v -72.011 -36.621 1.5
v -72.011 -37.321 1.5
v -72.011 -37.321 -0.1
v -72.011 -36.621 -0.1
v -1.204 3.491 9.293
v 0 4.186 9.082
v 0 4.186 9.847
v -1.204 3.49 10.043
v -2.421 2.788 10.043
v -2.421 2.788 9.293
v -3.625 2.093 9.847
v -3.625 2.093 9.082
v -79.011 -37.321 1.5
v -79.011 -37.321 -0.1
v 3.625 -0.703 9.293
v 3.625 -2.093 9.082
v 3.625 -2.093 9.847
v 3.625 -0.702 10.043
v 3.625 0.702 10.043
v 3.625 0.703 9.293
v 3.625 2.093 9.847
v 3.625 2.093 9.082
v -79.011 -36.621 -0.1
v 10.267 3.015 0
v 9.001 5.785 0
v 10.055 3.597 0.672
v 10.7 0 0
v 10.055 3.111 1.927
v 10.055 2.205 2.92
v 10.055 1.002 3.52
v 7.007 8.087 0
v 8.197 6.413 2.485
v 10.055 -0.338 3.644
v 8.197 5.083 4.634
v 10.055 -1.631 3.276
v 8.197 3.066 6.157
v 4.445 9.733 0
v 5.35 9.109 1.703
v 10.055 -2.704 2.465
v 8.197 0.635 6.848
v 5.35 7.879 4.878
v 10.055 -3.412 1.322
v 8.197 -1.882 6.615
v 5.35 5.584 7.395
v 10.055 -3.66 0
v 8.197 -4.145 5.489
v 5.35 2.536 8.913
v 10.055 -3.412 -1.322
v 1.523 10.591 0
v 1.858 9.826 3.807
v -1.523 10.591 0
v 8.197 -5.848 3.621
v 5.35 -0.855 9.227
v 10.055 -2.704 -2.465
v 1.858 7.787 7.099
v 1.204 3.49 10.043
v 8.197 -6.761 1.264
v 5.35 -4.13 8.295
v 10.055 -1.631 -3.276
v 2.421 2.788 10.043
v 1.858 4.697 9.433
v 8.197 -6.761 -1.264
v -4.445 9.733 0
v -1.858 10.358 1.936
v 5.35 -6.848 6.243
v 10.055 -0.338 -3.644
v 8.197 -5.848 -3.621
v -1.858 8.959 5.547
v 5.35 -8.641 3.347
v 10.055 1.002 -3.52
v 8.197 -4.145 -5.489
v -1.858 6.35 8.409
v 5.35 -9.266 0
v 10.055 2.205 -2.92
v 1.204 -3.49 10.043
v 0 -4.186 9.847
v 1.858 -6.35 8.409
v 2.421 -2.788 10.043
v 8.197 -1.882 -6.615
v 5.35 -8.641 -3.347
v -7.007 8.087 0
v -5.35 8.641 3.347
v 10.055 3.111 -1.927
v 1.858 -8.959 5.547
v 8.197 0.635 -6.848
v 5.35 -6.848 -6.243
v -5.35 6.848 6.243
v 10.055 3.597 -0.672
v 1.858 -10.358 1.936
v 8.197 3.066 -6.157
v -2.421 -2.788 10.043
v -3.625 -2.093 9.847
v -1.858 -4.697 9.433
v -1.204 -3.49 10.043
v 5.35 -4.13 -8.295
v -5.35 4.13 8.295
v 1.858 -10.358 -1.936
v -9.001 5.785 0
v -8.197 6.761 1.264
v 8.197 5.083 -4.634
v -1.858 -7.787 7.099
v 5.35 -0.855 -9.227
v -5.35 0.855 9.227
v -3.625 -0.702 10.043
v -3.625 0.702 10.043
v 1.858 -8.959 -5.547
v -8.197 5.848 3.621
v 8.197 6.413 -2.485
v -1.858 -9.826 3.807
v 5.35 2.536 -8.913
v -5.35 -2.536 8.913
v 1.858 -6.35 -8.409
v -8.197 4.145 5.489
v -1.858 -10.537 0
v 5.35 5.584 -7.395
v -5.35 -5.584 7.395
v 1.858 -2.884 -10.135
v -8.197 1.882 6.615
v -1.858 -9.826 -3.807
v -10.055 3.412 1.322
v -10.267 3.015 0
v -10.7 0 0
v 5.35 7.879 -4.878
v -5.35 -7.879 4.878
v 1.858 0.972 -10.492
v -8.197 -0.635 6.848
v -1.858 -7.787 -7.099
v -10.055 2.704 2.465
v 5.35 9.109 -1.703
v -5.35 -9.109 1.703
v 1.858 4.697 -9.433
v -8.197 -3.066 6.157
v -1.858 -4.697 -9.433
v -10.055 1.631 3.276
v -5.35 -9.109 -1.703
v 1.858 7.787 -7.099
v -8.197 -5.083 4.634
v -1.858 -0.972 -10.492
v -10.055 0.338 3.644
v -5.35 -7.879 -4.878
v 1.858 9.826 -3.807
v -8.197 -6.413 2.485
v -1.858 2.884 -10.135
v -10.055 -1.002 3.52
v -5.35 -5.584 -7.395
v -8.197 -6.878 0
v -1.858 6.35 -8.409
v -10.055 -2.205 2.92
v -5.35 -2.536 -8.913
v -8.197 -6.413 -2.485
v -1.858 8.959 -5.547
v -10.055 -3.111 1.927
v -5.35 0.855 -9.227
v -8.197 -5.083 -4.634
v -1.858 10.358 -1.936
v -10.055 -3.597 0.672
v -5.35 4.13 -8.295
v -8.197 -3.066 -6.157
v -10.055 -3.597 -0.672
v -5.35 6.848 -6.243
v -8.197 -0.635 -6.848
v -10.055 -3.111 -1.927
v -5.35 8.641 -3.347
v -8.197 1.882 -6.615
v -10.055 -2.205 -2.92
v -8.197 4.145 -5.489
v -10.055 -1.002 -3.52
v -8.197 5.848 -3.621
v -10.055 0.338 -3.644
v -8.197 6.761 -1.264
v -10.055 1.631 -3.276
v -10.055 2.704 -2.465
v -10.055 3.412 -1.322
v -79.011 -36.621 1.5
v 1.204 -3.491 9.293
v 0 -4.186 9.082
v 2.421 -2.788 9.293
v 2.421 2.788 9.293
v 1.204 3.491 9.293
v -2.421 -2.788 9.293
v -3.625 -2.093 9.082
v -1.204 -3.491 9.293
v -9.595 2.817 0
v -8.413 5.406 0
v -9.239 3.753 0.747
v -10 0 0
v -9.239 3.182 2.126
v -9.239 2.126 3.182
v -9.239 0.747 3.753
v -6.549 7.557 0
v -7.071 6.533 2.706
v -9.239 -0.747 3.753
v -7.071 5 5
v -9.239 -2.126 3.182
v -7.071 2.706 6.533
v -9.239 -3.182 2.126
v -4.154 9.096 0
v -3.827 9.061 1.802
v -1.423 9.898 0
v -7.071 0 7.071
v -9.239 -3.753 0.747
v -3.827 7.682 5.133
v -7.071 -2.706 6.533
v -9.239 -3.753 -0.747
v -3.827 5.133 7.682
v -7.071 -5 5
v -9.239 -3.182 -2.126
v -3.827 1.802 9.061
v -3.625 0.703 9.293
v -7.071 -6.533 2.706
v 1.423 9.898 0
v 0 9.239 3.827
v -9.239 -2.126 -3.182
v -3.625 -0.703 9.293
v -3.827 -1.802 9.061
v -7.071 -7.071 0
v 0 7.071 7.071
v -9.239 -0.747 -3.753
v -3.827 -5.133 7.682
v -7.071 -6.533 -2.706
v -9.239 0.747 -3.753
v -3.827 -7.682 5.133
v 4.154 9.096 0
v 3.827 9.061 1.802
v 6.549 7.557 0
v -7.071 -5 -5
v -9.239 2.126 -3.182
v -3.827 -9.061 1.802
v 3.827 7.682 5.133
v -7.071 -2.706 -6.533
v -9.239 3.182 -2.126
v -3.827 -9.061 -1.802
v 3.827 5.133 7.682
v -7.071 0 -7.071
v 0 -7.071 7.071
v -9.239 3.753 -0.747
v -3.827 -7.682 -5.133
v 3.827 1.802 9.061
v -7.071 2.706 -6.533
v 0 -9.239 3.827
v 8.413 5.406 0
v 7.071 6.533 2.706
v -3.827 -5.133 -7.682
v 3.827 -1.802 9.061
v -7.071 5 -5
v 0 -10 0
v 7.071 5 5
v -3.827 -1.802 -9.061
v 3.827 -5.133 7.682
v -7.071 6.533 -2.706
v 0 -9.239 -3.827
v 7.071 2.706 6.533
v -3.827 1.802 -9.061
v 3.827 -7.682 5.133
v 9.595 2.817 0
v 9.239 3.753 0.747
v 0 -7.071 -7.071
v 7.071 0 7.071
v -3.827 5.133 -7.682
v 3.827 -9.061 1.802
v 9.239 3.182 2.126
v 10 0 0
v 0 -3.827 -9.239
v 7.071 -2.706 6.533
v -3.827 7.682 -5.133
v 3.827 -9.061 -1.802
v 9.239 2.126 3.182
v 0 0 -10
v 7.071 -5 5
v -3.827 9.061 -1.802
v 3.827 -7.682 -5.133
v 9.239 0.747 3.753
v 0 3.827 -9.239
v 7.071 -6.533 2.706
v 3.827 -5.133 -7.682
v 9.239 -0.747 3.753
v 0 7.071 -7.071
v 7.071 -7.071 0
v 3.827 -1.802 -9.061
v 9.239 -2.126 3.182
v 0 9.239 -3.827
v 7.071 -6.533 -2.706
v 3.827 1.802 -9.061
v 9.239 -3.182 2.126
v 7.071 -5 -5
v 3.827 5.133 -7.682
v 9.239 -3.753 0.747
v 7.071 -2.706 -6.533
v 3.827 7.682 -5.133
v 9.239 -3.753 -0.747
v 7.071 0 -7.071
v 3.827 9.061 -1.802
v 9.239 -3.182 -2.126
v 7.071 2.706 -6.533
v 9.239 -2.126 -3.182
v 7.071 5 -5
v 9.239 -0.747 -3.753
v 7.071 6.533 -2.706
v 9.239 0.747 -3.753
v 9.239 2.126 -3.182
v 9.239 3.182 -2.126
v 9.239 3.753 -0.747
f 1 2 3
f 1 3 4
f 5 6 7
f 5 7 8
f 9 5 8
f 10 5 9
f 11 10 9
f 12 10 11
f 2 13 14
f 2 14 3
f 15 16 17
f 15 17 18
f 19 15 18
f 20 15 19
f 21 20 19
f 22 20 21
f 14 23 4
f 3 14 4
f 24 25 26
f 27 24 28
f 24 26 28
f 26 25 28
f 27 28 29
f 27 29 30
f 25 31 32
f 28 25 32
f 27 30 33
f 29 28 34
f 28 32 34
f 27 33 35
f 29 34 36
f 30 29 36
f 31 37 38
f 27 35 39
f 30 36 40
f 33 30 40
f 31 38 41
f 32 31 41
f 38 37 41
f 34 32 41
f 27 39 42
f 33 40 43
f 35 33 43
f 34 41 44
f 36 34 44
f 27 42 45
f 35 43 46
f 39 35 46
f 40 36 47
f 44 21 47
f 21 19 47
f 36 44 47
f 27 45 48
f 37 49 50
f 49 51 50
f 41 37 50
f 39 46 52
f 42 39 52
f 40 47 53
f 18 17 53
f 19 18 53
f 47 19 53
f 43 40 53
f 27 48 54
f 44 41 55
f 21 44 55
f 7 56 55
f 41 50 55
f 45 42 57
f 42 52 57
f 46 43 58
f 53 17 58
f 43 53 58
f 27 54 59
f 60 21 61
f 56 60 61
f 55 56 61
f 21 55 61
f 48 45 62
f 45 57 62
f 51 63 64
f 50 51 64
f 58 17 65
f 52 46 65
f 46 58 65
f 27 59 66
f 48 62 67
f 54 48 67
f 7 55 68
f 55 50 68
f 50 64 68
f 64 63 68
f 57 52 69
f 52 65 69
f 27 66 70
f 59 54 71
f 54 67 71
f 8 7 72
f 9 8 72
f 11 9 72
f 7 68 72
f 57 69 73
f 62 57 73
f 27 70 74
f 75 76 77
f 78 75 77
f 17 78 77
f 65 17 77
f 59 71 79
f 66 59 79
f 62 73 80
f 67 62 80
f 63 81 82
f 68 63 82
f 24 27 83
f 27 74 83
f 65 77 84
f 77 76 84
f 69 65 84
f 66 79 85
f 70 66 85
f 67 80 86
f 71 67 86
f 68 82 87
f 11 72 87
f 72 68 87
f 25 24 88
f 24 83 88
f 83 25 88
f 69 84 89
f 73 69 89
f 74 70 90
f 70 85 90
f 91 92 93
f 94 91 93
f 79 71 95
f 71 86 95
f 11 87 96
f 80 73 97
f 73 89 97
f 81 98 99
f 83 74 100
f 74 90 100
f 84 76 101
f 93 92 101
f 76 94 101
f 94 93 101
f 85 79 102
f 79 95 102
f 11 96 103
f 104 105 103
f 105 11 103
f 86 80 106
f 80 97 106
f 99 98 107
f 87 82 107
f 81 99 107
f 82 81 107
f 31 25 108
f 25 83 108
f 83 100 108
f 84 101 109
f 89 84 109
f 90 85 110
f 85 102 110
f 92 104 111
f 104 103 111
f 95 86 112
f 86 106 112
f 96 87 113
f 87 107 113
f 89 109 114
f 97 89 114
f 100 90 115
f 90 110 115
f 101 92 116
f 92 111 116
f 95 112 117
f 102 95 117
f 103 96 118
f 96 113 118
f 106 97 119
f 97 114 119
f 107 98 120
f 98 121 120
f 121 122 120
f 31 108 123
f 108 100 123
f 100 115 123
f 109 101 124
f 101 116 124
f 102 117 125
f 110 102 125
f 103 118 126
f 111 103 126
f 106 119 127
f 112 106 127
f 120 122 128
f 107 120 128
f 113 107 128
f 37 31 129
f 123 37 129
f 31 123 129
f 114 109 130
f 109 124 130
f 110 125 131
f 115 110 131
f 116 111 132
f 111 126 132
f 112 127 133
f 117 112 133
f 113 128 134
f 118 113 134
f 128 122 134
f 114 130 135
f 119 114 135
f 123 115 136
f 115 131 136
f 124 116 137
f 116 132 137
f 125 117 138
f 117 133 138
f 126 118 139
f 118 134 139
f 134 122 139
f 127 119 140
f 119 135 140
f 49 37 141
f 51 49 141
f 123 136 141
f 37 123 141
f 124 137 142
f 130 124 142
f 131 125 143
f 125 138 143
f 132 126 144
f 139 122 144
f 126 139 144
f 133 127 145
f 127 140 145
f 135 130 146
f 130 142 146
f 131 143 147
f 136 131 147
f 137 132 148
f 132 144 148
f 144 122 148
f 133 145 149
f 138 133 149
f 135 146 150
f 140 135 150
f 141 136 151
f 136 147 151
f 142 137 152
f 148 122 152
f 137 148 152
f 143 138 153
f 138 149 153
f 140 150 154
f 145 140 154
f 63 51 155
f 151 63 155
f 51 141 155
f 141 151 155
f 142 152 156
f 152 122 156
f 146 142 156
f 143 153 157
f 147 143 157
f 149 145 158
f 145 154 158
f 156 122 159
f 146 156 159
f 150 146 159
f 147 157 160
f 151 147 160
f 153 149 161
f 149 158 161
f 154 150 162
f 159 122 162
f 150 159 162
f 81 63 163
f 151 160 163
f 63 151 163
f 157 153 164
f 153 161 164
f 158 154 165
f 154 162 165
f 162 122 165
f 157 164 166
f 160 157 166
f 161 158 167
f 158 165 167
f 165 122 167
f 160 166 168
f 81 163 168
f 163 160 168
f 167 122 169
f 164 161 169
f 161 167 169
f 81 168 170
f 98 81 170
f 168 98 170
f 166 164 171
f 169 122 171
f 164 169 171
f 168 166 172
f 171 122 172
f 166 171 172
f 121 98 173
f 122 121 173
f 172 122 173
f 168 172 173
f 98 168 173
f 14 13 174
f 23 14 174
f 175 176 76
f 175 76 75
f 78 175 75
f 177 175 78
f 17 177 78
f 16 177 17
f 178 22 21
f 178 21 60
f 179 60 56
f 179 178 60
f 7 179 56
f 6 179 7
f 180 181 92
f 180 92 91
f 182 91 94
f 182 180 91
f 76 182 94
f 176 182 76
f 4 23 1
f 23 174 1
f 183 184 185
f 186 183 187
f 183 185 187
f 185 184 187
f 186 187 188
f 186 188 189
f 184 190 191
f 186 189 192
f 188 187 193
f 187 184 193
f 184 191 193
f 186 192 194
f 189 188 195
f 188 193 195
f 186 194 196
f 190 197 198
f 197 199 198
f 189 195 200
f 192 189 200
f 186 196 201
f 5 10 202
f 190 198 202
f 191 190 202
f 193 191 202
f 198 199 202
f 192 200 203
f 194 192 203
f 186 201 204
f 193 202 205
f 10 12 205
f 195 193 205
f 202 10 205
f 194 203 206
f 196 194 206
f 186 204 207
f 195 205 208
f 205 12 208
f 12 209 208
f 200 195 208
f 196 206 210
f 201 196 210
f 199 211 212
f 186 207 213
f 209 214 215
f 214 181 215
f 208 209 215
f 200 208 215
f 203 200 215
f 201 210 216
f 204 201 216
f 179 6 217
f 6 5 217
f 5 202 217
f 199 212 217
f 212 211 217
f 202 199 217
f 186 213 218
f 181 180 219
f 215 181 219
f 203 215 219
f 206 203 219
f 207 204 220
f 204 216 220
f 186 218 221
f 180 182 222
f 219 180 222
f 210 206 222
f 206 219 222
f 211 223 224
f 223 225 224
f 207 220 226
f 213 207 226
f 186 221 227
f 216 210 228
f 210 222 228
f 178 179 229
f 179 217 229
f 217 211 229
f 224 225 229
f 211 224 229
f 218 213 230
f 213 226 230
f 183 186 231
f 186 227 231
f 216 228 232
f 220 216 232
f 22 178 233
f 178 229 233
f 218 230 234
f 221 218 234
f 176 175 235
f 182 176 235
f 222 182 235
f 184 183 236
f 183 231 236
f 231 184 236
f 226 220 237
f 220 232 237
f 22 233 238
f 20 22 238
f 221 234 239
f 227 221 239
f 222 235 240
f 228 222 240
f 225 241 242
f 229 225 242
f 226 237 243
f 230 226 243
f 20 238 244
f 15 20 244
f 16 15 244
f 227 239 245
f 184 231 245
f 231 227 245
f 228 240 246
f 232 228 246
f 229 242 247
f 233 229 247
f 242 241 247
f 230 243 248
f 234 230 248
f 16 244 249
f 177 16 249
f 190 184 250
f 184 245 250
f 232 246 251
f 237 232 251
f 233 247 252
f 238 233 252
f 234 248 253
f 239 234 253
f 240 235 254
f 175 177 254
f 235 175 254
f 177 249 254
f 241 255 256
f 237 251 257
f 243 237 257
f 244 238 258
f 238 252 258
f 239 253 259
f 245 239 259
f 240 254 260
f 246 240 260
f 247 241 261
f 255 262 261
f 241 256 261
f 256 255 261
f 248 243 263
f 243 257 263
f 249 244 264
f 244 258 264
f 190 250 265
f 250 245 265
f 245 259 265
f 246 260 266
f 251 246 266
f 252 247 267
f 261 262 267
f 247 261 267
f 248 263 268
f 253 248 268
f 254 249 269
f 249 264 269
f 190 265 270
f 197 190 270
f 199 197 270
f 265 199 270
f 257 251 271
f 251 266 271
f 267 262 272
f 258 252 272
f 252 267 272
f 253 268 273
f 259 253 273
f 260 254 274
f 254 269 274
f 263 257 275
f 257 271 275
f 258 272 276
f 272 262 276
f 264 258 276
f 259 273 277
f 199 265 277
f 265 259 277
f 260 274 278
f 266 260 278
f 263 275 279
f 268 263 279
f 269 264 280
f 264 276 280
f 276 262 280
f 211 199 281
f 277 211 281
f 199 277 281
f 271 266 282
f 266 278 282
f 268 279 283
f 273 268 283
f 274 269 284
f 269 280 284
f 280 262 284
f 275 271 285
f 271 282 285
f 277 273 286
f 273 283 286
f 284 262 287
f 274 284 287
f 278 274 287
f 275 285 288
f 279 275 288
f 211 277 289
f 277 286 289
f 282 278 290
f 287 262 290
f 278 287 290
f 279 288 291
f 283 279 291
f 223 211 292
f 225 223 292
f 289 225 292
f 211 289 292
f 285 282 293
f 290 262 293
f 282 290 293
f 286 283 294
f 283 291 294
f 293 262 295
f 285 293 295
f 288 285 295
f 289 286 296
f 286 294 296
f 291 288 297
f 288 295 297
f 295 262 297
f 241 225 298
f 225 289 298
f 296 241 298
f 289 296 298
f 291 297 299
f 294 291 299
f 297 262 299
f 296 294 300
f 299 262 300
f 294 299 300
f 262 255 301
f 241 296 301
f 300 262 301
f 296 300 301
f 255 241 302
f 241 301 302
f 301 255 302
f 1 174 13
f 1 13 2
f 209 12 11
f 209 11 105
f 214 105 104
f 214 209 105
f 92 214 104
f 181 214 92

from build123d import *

# Parameters (mm, degrees)
F3_DEPTH      = 25
F4_W          = 7
F4_H          = 0.7
F5_DEPTH      = 1.5
F5_DEPTH_BACK = 0.1


with BuildPart() as f2:
    # F0 (on Top) → F2 (revolve)
    with BuildSketch(Plane.XY):
        with BuildLine():
            ThreePointArc((-10, 0), (0, 10), (10, 0))
            Line((10, 0), (10.7, 0))
            ThreePointArc((10.7, 0), (0, 10.7), (-10.7, 0))
            Line((-10.7, 0), (-10, 0))
        make_face()
    revolve(axis=Axis((-10.35, 0, 0), (1, 0, 0)))

    # F1 (on face) → F3 (cut)
    with BuildSketch(Plane.XY):
        Polygon((3.625, -2.092895), (3.625, 2.092895), (0, 4.185789), (-3.625, 2.092895), (-3.625, -2.092895), (0, -4.185789), align=None)
    extrude(amount=F3_DEPTH, mode=Mode.SUBTRACT)


with BuildPart() as f5:
    # F4 (on Top) → F5 (new body, two sides)
    with BuildSketch(Plane.XY) as f5_sk:
        with Locations((-75.510782, -36.971195)):
            Rectangle(F4_W, F4_H)
    extrude(amount=F5_DEPTH)
    extrude(f5_sk.sketch, amount=-F5_DEPTH_BACK)


solid = Compound([f2.part, f5.part])
